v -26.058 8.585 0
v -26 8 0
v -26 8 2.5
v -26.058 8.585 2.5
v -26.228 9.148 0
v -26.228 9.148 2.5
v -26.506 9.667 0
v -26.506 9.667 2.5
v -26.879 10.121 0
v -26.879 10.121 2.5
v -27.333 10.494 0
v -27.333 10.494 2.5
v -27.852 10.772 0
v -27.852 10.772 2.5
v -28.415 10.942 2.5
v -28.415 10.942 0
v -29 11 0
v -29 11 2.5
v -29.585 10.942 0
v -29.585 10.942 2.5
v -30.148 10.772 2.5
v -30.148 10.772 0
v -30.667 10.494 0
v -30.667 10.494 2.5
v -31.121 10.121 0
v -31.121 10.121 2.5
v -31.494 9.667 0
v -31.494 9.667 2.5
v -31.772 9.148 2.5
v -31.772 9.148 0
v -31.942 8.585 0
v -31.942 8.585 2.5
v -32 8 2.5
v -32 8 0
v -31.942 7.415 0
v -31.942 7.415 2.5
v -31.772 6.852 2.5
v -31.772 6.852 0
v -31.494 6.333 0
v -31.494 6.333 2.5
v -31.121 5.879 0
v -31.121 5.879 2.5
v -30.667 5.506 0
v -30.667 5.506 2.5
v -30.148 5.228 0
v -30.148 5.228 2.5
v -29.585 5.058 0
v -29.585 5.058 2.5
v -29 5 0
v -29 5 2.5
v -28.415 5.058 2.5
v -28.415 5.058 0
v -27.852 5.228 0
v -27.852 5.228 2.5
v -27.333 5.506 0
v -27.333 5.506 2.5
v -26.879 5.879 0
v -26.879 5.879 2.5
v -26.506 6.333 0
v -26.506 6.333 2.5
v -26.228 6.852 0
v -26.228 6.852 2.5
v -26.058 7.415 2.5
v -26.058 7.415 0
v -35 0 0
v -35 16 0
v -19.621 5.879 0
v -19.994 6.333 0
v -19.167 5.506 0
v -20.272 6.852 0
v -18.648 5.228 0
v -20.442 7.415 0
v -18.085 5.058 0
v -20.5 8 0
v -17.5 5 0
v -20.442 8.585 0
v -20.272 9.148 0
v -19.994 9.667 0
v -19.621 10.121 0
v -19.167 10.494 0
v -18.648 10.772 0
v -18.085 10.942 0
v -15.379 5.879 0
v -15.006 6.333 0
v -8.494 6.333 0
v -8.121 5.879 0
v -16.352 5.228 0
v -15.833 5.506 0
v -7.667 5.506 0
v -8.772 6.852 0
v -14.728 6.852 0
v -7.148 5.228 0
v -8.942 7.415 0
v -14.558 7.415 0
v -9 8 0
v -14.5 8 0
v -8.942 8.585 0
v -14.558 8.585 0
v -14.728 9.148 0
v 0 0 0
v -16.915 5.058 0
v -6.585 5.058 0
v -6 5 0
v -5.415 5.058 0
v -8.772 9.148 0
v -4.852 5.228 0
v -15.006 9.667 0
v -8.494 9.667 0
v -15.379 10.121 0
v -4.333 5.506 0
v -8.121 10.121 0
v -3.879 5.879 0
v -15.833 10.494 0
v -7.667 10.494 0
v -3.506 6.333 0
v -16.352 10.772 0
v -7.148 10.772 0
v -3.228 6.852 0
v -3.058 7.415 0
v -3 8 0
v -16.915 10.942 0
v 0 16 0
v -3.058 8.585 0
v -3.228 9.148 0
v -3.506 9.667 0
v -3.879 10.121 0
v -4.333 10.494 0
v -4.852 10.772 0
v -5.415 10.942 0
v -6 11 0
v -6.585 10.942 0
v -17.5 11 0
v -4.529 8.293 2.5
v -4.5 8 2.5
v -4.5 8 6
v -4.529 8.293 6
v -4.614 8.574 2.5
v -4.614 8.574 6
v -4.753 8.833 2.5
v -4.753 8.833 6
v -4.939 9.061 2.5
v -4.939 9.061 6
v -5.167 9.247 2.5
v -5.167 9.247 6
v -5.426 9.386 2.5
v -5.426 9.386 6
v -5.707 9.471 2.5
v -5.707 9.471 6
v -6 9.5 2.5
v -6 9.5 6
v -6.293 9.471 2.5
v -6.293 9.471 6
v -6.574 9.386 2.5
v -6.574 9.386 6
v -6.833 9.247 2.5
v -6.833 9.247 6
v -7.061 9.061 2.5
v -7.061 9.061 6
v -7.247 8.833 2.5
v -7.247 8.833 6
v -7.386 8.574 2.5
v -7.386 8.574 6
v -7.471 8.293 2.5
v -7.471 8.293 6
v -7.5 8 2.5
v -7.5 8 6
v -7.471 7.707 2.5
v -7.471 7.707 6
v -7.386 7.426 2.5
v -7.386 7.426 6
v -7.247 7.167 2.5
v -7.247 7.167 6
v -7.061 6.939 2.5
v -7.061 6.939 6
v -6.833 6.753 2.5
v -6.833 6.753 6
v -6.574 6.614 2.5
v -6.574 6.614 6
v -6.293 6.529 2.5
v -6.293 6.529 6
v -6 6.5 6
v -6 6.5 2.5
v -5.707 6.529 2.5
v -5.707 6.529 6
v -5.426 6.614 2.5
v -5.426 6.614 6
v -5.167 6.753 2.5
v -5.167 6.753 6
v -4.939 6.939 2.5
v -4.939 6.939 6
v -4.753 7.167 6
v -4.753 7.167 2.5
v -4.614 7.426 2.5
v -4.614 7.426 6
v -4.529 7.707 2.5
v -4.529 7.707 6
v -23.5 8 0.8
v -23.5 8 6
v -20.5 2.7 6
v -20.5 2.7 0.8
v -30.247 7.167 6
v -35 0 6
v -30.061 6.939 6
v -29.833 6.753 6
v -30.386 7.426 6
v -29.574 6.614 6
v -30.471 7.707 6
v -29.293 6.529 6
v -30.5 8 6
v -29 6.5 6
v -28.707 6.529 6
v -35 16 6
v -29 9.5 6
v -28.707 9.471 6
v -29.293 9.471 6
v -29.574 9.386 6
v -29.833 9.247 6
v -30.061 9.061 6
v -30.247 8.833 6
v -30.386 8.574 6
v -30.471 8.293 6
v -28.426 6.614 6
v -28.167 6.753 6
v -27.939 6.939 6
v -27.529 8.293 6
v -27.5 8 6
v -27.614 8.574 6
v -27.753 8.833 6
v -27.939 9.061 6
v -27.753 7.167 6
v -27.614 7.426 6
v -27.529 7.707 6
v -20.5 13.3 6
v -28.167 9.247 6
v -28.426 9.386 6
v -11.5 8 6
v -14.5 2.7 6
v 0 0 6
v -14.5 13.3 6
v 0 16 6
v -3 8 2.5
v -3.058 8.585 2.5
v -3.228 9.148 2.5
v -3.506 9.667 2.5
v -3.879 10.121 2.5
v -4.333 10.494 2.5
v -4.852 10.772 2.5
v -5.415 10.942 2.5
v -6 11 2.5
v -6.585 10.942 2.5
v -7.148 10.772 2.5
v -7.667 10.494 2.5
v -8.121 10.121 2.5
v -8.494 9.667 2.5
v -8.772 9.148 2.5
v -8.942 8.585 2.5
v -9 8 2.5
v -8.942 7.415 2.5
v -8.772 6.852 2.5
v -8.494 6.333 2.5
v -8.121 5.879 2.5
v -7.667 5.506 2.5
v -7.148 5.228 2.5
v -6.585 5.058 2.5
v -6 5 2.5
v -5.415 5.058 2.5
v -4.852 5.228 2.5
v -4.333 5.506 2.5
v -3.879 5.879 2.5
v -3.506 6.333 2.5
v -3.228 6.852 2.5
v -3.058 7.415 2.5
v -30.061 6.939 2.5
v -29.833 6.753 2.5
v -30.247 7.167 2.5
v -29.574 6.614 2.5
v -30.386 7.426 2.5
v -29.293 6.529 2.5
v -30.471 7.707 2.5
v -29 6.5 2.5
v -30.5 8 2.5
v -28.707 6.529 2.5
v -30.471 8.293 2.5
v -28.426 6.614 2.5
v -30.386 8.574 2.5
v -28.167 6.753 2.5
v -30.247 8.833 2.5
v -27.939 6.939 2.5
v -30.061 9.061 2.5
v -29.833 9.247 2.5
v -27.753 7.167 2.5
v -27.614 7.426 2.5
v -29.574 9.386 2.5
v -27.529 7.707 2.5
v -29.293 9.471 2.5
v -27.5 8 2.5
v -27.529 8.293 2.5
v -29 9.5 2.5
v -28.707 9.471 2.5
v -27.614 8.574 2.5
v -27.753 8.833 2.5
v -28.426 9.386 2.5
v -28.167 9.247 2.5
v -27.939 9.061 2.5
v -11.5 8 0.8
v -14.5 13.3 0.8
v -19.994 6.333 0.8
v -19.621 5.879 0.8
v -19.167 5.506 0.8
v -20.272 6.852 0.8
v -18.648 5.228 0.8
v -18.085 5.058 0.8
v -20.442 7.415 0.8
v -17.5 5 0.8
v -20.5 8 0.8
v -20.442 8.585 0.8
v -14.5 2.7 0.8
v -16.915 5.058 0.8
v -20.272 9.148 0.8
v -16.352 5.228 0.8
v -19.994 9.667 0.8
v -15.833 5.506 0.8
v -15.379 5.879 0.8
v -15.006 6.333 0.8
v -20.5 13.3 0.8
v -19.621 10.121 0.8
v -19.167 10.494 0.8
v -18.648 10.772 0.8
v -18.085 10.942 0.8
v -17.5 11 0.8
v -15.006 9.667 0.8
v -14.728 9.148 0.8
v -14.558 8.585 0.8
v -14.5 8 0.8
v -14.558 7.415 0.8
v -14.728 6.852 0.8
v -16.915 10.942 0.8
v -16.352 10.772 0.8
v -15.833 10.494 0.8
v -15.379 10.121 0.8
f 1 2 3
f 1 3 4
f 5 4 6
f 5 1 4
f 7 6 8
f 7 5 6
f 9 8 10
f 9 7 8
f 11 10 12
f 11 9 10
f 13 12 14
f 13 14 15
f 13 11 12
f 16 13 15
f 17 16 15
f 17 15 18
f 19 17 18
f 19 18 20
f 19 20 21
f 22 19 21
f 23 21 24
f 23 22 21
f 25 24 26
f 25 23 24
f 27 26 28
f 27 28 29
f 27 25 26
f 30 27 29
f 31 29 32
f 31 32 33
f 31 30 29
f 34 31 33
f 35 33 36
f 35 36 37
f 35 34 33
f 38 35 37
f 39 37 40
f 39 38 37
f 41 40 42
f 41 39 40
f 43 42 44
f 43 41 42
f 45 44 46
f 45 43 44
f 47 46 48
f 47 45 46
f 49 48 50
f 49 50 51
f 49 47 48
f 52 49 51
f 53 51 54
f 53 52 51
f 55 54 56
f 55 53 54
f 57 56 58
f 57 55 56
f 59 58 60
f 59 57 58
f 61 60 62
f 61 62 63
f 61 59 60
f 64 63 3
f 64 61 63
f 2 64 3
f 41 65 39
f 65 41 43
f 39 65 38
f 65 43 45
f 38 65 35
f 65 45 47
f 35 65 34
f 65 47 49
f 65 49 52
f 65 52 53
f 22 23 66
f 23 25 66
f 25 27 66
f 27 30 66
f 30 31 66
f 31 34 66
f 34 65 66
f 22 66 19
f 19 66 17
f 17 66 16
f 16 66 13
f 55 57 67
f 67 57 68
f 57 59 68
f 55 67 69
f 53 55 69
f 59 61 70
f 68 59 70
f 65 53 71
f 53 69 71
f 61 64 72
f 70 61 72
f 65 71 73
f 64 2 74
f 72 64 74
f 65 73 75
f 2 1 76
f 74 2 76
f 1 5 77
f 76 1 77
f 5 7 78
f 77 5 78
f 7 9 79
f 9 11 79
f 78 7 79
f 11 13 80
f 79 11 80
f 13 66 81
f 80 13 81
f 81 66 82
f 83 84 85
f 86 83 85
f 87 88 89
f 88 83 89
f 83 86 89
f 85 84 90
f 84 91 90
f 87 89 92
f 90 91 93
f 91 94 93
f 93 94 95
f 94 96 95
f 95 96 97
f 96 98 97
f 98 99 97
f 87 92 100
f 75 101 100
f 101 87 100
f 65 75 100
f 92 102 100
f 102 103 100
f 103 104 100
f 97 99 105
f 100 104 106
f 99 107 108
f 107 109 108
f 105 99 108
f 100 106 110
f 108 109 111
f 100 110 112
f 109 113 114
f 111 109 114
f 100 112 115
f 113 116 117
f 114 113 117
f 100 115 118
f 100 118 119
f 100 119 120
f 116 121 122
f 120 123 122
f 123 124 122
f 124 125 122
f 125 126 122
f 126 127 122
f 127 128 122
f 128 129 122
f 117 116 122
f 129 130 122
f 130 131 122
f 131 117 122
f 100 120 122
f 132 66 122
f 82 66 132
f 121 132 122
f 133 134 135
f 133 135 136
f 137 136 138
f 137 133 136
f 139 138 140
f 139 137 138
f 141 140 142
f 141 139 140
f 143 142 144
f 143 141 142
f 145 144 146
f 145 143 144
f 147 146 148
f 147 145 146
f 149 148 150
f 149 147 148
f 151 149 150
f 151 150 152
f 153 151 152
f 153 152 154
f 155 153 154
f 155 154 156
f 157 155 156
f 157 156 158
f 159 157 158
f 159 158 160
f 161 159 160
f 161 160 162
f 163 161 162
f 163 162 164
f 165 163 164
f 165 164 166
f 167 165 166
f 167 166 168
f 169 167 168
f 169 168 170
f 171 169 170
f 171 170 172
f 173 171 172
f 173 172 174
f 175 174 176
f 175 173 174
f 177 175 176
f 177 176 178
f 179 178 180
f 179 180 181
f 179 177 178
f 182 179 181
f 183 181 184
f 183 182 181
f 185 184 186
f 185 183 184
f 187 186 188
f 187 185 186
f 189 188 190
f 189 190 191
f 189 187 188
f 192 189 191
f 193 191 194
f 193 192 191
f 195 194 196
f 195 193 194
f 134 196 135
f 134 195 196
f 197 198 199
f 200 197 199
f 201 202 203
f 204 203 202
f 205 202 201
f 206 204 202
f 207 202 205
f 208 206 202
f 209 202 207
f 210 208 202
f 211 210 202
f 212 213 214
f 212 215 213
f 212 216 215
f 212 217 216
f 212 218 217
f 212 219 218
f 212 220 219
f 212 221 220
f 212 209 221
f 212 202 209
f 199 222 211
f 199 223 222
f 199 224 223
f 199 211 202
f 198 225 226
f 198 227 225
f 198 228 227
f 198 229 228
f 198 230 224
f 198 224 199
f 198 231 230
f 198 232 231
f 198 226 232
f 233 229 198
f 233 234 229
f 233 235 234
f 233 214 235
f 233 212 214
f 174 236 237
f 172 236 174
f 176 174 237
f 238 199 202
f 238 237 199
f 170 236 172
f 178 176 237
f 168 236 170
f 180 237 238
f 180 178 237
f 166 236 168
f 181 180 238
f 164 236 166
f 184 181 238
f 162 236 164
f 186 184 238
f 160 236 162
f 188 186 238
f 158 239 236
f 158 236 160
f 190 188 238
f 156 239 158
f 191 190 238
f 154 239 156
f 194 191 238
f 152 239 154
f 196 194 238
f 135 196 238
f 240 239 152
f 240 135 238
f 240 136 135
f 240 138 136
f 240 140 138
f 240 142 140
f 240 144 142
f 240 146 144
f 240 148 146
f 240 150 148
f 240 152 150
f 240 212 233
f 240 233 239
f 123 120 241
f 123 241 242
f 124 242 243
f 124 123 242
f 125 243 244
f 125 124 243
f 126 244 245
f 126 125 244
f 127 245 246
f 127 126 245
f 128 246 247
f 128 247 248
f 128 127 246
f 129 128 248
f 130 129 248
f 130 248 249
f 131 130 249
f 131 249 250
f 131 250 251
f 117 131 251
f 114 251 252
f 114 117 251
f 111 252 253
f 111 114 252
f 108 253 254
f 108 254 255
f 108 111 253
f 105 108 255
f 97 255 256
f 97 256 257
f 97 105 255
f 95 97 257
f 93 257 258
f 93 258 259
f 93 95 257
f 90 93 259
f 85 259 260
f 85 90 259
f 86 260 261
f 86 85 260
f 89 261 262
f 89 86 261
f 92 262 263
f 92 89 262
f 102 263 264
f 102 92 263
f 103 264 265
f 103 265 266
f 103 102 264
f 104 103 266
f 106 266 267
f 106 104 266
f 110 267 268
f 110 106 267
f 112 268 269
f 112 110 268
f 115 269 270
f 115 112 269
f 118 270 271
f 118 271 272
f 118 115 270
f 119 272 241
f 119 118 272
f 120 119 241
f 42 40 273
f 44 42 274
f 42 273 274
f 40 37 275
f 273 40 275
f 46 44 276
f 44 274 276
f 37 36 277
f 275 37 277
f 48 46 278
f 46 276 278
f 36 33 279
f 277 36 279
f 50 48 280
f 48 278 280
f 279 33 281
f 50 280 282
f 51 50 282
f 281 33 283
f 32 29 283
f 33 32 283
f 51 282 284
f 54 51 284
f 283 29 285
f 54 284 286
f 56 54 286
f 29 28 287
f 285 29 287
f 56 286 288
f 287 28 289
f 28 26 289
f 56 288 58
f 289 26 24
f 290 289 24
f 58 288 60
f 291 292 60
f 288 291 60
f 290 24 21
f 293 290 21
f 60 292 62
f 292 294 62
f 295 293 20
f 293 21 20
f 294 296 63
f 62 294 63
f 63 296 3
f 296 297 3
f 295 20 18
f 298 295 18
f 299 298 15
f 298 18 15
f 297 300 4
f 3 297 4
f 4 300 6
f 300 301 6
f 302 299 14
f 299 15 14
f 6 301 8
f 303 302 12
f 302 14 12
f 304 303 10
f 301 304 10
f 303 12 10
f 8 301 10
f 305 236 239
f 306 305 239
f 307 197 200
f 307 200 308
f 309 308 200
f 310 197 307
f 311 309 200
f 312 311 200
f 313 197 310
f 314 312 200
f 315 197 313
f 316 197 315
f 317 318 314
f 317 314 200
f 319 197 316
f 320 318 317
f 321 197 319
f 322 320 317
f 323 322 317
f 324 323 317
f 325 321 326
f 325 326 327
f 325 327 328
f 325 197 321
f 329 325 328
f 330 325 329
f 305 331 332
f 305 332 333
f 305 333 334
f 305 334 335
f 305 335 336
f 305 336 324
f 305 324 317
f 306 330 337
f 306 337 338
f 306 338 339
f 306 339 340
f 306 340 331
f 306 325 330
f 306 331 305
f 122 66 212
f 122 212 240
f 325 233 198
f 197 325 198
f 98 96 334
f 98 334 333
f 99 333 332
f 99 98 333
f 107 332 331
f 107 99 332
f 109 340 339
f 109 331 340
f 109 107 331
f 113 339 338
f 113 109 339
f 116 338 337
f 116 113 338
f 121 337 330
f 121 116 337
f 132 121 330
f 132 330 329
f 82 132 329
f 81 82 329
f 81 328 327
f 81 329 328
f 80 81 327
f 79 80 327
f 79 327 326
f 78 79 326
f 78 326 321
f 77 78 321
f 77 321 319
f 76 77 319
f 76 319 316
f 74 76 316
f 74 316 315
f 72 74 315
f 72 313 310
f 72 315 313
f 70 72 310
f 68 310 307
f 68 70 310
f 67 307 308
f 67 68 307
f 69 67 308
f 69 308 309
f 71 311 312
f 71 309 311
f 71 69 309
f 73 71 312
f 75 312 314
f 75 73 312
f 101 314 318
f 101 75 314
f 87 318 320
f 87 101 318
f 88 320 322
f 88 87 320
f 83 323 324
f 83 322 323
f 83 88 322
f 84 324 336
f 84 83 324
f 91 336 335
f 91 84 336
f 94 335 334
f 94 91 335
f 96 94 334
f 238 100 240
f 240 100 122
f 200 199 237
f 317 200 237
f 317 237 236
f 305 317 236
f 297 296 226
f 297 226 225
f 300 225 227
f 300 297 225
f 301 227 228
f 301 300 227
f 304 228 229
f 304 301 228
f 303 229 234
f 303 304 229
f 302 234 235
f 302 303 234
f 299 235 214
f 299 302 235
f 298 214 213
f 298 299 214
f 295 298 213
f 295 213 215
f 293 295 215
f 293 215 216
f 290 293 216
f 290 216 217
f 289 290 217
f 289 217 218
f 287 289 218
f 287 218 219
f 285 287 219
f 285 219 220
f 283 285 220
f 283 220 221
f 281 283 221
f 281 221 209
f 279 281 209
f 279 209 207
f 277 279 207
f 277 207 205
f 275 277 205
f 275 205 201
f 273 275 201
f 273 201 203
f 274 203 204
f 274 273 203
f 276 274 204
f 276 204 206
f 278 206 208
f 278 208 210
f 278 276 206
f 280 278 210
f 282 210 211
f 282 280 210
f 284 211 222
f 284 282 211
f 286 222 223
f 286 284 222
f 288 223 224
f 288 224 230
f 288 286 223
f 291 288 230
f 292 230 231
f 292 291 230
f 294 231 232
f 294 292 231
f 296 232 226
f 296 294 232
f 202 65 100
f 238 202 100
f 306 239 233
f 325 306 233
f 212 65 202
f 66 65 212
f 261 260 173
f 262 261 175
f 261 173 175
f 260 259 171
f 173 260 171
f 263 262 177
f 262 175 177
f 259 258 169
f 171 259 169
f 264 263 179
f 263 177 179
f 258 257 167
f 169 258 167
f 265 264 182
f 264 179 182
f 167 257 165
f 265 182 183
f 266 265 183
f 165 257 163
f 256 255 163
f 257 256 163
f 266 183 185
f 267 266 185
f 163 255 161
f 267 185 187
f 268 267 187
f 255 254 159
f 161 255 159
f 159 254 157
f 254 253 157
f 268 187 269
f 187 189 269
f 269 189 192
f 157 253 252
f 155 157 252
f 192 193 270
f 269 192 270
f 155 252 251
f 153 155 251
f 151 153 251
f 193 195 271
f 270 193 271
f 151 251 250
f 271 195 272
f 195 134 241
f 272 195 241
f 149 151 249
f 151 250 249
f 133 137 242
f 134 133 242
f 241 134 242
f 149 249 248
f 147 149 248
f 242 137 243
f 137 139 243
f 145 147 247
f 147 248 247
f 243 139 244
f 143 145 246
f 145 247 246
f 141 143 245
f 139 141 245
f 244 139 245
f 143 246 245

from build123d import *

# Parameters (mm, degrees)
F0_W     = 35
F0_H     = 16
F0_R     = 1.5
F0_R_2   = 3
F1_DEPTH = 6
F3_DEPTH = 5.2
F4_R     = 3
F5_DEPTH = 2.5


with BuildPart() as f1:
    # F0 (on Top) → F1 (new body)
    with BuildSketch(Plane.XY):
        with Locations((-17.5, 8)):
            Rectangle(F0_W, F0_H)
        with Locations((-29, 8)):
            Circle(F0_R, mode=Mode.SUBTRACT)
        with Locations((-17.5, 8)):
            Circle(F0_R_2, mode=Mode.SUBTRACT)
        with Locations((-6, 8)):
            Circle(F0_R, mode=Mode.SUBTRACT)
    extrude(amount=F1_DEPTH)

    # F2 (on face) → F3 (cut)
    with BuildSketch(Plane.XY.offset(6)):
        with BuildLine():
            Line((-20.5, 2.7), (-17.5, 2.7))
            Line((-17.5, 2.7), (-17.5, 5))
            ThreePointArc((-17.5, 5), (-20.5, 8), (-17.5, 11))
            Line((-17.5, 11), (-17.5, 13.3))
            Line((-17.5, 13.3), (-20.5, 13.3))
            Line((-20.5, 13.3), (-23.5, 8))
            Line((-23.5, 8), (-20.5, 2.7))
        make_face()
        with BuildLine():
            ThreePointArc((-17.5, 11), (-15.37868, 10.12132), (-14.5, 8))
            Line((-14.5, 8), (-11.5, 8))
            Line((-11.5, 8), (-14.5, 13.3))
            Line((-14.5, 13.3), (-17.5, 13.3))
            Line((-17.5, 13.3), (-17.5, 11))
        make_face()
        with BuildLine():
            Line((-17.5, 5), (-17.5, 2.7))
            Line((-17.5, 2.7), (-14.5, 2.7))
            Line((-14.5, 2.7), (-11.5, 8))
            Line((-11.5, 8), (-14.5, 8))
            ThreePointArc((-14.5, 8), (-15.37868, 5.87868), (-17.5, 5))
        make_face()
    extrude(amount=-F3_DEPTH, mode=Mode.SUBTRACT)

    # F4 (on Top) → F5 (cut)
    with BuildSketch(Plane.XY):
        with Locations((-29, 8)):
            Circle(F4_R)
        with Locations((-6, 8)):
            Circle(F4_R)
    extrude(amount=F5_DEPTH, mode=Mode.SUBTRACT)


solid = f1.part
